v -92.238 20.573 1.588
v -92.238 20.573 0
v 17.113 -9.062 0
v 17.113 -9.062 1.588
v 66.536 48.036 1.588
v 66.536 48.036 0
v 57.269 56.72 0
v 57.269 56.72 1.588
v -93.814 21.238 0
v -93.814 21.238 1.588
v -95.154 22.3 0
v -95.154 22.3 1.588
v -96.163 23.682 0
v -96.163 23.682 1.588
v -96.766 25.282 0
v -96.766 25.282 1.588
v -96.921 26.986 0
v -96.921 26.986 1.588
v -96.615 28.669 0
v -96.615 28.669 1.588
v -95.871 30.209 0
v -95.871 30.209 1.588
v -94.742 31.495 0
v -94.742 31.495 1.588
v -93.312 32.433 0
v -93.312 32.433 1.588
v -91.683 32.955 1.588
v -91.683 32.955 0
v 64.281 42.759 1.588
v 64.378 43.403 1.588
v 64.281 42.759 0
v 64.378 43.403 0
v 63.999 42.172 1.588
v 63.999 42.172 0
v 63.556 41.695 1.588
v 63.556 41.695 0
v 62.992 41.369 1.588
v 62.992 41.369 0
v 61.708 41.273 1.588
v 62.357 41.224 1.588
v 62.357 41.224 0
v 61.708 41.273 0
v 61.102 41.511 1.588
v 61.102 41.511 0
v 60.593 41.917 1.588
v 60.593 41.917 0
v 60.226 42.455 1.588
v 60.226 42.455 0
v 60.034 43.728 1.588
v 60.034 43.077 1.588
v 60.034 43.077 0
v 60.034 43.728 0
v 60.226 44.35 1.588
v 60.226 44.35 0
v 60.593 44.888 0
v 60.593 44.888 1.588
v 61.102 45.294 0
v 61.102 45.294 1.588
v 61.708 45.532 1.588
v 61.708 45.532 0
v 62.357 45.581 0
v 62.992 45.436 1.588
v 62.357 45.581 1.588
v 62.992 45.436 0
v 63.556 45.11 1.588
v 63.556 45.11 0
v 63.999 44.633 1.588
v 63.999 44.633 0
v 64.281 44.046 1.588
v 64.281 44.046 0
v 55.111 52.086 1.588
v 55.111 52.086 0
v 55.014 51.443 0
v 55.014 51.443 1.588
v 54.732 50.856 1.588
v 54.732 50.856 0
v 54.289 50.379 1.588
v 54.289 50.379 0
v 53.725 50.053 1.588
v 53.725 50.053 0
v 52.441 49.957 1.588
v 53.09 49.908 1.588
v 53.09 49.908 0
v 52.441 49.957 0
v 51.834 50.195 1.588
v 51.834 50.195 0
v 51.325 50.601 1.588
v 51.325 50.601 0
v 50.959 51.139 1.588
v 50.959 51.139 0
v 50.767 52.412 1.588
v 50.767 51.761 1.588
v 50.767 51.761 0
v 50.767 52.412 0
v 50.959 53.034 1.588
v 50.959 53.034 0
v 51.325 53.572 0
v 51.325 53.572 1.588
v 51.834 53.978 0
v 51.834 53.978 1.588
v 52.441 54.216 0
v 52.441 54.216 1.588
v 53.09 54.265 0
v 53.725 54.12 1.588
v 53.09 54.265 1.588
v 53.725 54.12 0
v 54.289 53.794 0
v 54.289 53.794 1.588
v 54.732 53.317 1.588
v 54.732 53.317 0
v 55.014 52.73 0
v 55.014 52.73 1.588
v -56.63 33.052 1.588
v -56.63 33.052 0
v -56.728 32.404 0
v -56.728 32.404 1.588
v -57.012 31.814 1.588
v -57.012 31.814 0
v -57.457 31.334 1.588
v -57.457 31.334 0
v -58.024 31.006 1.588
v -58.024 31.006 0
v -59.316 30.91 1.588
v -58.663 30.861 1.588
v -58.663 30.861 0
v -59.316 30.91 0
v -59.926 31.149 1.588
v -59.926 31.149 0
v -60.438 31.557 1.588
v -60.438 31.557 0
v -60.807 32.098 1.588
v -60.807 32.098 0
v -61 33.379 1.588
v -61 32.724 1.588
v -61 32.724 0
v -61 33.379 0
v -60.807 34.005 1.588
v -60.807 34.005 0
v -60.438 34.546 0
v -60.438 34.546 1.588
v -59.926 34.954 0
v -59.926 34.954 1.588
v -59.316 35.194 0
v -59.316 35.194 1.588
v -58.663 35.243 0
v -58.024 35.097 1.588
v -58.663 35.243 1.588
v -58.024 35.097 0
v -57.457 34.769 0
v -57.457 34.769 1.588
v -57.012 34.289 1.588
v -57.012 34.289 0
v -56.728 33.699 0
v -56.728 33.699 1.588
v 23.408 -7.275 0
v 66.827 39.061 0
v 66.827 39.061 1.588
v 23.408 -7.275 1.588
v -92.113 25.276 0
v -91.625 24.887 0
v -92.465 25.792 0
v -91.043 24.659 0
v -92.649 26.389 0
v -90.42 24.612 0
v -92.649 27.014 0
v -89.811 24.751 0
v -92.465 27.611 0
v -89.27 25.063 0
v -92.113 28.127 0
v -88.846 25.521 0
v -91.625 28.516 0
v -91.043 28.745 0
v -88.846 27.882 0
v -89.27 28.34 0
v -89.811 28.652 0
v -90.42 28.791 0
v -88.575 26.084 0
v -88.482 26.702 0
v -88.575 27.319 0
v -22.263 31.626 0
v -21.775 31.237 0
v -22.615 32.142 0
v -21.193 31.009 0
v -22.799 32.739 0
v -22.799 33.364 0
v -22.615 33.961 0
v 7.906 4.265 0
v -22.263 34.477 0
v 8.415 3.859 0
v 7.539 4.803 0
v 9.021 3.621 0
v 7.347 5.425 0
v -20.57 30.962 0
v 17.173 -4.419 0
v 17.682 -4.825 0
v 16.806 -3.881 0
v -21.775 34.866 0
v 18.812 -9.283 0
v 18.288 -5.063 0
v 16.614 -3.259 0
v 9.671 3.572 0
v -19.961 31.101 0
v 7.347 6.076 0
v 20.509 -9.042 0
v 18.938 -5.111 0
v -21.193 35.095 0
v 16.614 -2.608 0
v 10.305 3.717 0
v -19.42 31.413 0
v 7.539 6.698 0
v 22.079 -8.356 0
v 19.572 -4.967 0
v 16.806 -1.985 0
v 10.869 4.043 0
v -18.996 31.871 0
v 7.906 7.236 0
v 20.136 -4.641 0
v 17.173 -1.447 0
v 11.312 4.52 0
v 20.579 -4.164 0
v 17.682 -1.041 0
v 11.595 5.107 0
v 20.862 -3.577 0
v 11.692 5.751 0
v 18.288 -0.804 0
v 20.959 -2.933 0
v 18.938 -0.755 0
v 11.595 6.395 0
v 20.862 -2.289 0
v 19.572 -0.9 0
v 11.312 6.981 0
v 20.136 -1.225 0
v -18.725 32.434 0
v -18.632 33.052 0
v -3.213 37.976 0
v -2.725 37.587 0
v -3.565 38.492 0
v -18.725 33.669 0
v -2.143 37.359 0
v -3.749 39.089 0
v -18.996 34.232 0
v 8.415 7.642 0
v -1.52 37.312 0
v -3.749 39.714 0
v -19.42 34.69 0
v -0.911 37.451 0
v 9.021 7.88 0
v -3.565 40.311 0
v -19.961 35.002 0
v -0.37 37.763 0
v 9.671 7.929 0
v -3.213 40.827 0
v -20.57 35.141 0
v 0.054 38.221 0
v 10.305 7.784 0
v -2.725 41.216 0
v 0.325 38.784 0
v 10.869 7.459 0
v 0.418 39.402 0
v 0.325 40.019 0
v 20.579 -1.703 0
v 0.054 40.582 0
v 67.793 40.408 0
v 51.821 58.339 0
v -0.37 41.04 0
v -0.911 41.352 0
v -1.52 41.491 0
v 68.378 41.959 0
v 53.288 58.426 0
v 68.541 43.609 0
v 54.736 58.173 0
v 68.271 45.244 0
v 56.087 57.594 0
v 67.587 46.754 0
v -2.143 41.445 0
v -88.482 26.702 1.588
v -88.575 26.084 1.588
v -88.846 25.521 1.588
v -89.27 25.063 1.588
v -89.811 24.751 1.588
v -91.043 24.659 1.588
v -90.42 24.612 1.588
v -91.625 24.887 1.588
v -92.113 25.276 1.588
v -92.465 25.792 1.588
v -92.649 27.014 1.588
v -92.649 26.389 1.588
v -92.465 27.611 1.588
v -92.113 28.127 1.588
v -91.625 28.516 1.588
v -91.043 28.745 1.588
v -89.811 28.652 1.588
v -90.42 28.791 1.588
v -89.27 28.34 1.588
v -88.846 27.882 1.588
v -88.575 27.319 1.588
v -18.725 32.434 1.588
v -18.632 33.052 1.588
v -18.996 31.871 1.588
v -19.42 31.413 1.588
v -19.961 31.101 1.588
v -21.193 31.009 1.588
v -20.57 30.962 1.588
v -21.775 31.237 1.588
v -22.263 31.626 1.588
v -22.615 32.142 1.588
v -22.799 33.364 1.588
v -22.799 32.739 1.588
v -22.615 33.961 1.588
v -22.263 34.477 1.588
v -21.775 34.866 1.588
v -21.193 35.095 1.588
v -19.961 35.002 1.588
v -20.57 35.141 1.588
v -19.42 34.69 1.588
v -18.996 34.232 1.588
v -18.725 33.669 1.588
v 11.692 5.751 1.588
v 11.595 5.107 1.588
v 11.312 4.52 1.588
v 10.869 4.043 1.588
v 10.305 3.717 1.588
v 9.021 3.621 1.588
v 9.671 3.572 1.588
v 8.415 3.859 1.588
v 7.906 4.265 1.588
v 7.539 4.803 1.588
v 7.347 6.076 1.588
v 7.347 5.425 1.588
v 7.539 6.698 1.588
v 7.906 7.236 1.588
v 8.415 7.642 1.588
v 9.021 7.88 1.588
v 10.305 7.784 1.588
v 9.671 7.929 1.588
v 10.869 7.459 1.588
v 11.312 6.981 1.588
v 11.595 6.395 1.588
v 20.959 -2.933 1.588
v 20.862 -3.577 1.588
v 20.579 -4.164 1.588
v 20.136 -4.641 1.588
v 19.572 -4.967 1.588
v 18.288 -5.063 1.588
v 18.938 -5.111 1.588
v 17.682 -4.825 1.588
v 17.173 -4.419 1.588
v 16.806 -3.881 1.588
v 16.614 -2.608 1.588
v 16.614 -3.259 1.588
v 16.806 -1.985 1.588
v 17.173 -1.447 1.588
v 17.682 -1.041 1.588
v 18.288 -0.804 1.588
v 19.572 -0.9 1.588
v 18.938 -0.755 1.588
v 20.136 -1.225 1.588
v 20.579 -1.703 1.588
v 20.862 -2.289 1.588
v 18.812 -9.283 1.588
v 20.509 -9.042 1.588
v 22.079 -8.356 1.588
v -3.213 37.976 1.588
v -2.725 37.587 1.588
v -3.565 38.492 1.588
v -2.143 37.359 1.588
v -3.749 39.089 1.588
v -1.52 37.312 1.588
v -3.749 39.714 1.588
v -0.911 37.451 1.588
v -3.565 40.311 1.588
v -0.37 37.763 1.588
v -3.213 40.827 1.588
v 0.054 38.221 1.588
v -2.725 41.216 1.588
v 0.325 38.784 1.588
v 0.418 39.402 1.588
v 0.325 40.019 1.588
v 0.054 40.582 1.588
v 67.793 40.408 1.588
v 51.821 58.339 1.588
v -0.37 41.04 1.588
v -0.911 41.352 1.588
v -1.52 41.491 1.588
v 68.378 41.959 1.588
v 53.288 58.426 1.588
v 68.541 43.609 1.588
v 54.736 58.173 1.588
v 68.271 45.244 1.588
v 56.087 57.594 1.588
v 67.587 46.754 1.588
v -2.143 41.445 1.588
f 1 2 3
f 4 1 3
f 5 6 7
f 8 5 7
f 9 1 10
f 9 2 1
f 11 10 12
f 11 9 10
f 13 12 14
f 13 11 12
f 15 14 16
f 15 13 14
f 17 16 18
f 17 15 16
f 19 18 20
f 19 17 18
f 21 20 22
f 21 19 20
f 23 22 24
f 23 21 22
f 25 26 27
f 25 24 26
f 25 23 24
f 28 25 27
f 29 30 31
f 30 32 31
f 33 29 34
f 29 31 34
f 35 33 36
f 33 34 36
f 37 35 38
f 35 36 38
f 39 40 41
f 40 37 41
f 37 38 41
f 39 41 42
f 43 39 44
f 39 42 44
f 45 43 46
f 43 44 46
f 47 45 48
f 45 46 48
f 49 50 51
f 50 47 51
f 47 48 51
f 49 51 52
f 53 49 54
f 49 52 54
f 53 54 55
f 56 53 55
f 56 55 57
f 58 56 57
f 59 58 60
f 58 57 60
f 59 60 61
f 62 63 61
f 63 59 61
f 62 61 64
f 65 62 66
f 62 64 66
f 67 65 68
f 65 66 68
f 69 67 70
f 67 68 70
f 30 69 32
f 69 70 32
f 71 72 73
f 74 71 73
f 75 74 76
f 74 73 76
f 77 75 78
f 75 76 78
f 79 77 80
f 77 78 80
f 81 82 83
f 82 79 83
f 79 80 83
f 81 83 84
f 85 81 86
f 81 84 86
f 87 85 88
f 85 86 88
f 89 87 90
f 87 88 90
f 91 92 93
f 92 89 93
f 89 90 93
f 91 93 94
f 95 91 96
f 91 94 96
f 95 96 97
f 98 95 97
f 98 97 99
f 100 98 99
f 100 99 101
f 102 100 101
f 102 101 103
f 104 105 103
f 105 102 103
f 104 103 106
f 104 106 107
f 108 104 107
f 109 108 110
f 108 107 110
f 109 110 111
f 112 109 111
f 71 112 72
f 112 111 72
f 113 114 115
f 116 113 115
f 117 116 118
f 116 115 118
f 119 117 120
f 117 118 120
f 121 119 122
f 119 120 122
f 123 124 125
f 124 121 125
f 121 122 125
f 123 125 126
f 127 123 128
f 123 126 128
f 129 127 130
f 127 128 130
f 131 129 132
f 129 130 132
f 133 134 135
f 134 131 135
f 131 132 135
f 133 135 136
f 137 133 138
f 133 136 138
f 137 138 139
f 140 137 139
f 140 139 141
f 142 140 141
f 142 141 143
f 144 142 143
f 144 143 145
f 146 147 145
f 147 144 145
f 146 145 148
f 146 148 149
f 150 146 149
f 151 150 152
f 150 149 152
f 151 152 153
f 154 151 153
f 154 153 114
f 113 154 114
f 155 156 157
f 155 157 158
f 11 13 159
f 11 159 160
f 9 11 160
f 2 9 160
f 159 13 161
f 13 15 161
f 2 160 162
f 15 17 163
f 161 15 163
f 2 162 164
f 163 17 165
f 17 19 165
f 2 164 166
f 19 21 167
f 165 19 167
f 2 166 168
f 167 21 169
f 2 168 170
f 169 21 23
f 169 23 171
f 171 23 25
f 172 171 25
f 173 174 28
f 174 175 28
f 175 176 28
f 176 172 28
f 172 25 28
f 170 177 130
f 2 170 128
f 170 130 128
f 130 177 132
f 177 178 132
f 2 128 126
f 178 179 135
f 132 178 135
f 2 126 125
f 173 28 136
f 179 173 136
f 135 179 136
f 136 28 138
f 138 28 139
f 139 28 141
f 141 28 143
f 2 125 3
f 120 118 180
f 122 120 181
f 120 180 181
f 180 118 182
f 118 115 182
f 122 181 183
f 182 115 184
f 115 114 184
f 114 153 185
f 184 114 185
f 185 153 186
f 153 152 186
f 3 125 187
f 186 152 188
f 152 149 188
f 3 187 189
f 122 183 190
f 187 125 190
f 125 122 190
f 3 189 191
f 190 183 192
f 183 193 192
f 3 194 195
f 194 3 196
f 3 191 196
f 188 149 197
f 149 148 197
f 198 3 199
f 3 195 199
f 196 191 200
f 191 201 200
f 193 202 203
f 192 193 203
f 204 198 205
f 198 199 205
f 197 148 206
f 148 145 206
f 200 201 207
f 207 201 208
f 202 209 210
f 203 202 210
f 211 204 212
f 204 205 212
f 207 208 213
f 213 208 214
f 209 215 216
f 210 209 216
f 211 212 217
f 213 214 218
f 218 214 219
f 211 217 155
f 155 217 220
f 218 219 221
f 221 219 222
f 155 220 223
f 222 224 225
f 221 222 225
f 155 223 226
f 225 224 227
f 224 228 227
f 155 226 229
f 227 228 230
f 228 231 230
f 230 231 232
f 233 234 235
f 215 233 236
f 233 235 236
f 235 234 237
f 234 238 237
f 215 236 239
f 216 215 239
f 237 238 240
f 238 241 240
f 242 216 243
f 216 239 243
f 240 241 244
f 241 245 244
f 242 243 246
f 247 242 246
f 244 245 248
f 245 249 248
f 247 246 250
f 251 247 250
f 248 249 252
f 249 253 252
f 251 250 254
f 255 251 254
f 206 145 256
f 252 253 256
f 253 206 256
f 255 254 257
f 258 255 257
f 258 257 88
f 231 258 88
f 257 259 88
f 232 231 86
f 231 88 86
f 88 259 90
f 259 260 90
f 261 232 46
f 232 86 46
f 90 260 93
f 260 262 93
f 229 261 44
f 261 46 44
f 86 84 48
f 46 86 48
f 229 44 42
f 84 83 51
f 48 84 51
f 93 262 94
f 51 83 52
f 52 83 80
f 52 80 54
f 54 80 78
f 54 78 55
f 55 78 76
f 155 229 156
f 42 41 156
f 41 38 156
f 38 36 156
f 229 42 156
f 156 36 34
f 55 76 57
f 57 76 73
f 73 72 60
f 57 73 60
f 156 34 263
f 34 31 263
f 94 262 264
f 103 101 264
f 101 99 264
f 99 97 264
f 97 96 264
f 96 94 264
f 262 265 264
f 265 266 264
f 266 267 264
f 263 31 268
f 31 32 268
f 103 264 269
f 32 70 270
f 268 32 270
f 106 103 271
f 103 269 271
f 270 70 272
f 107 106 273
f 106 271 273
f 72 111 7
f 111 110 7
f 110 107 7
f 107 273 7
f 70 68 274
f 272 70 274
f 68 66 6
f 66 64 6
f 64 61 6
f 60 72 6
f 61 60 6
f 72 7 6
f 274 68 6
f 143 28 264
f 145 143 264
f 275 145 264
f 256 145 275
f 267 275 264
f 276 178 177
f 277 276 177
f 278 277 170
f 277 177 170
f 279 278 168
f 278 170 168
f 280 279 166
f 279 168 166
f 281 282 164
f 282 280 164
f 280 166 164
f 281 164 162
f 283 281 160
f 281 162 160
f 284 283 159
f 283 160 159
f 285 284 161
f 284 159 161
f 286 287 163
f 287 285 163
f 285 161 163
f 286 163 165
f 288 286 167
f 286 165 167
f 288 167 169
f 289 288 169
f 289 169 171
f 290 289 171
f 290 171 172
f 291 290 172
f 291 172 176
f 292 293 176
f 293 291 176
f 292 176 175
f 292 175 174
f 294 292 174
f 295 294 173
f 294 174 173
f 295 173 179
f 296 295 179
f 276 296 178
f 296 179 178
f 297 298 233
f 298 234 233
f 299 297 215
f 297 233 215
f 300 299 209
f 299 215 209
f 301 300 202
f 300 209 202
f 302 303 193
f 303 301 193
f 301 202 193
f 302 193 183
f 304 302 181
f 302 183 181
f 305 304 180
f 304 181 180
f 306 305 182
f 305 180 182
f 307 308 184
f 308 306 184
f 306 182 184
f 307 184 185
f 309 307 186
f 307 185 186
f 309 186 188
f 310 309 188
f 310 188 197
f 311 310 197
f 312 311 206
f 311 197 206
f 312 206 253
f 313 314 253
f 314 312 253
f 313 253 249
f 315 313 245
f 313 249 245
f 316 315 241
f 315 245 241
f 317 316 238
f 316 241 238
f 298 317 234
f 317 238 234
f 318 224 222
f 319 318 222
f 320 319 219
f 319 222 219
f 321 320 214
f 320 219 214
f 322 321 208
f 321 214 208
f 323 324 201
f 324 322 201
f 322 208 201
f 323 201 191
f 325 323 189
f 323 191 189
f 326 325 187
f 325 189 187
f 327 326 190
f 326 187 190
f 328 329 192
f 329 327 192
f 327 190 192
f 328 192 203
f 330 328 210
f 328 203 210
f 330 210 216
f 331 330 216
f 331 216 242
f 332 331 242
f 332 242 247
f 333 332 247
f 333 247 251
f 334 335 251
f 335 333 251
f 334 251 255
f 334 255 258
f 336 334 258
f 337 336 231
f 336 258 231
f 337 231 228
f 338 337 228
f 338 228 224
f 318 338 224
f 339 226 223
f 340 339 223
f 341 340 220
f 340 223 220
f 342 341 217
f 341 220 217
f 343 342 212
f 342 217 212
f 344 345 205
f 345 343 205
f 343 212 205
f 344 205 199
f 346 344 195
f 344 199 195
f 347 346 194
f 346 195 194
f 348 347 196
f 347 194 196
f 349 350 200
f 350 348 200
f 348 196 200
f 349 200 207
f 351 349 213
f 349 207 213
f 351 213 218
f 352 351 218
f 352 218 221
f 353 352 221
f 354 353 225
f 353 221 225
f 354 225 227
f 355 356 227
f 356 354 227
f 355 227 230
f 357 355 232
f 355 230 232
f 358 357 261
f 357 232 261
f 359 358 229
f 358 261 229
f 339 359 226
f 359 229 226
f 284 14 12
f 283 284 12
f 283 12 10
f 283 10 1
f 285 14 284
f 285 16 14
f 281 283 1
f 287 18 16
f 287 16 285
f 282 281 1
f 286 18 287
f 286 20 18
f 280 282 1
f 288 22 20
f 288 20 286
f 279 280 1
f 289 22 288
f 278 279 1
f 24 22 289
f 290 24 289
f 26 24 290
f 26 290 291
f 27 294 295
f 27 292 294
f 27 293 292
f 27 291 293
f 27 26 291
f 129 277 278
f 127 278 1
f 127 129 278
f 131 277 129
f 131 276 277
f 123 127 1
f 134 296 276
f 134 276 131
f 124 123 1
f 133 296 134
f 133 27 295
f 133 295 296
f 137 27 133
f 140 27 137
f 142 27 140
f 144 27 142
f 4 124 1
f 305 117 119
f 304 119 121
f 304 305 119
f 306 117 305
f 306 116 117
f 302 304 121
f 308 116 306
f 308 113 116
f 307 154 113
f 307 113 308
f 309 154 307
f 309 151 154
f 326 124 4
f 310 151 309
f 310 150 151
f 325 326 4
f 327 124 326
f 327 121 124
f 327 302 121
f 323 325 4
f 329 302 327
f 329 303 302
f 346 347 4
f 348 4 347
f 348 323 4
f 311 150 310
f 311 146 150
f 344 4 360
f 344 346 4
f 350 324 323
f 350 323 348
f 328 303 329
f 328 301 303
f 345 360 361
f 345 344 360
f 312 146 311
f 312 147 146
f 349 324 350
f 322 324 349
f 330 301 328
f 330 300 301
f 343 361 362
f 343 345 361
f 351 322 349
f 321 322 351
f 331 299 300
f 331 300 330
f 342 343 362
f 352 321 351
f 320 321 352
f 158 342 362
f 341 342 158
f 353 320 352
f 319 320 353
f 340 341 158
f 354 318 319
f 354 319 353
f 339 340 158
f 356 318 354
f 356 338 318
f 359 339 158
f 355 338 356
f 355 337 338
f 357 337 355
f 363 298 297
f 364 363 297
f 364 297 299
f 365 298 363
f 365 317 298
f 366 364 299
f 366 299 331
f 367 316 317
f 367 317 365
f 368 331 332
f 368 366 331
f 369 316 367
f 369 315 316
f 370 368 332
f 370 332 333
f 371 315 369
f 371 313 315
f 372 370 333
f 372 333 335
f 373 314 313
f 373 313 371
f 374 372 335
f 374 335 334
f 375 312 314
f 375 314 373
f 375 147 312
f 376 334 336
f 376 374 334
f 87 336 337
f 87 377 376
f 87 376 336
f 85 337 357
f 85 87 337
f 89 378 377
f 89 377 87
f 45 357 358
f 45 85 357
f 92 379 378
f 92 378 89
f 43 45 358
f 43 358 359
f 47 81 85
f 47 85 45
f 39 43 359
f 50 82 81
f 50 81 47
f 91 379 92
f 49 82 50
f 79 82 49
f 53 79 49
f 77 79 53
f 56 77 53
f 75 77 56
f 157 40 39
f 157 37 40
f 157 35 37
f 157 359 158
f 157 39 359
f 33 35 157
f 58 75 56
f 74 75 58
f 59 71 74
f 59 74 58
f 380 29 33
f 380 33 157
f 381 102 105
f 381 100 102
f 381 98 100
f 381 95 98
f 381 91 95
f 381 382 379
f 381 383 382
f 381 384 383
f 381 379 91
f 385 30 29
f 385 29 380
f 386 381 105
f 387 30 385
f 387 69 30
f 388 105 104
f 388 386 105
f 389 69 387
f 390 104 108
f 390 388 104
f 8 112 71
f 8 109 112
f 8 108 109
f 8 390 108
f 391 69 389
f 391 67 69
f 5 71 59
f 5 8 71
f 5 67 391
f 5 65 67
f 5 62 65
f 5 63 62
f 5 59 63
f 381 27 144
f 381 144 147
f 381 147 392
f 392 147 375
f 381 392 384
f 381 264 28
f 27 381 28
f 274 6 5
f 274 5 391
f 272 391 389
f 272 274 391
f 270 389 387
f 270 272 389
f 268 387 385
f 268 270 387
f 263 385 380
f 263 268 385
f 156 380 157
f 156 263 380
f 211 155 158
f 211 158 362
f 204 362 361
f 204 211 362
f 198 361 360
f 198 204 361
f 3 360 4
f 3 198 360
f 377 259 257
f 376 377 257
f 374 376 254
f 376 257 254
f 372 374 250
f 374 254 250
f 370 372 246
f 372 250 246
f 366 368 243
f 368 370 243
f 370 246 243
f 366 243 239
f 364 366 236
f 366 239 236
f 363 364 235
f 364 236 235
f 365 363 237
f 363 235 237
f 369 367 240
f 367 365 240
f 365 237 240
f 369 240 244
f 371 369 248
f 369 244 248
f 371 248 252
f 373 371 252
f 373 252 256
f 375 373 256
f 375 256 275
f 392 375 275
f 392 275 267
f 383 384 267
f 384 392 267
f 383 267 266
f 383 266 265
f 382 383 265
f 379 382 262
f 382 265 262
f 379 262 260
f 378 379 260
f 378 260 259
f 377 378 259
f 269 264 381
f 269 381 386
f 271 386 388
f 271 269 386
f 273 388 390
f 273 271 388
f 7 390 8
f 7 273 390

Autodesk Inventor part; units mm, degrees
ref_plane "YZ Plane" through (0, 0, 0) normal (1, 0, 0) x (0, 1, 0)
ref_plane "XZ Plane" through (0, 0, 0) normal (0, 1, 0) x (-1, 0, 0)
ref_plane "XY Plane" through (0, 0, 0) normal (0, 0, 1) x (1, 0, 0)
sketch "Sketch2" plane through (0, 0, 0) normal (0, 0, 1) x (1, 0, 0)
  circle A0 centre (-58.827, 33.0516) radius 2.1971
  circle A1 centre (-20.727, 33.0516) radius 2.0955
  circle A2 centre (62.1938, 43.4026) radius 2.1844
  circle A3 centre (52.9267, 52.0864) radius 2.1844
  circle A4 centre (18.7744, -2.9332) radius 2.1844
  circle A5 centre (9.5073, 5.7507) radius 2.1844
  circle A6 centre (-90.577, 26.7016) radius 2.0955
  circle A7 centre (-1.677, 39.4016) radius 2.0955
  arc A8 (-91.6831, 32.9546) -> (-92.238, 20.5727) centre (-90.577, 26.7016) ccw
  arc A9 (57.2686, 56.72) -> (51.8206, 58.3394) centre (52.9267, 52.0864) ccw
  arc A10 (66.8274, 39.0606) -> (66.5358, 48.0361) centre (62.1938, 43.4026) ccw
  arc A11 (17.1134, -9.0622) -> (23.408, -7.2752) centre (18.7744, -2.9332) ccw
  line L0 (-92.238, 20.5727) -> (17.1134, -9.0622)
  line L1 (66.8274, 39.0606) -> (23.408, -7.2752)
  line L2 (66.5358, 48.0361) -> (57.2686, 56.72)
  line L3 (51.8206, 58.3394) -> (-91.6831, 32.9546)
  dimension "d17" = 4.191
  dimension "d18" = 4.191
  dimension "d19" = 12.7
  dimension "d20" = 12.7
  dimension "d21" = 12.7
  dimension "d22" = 12.7
extrude "Extrusion2" add sketch "Sketch2" along normal blind 1.5875
properties part number "1-Gearbox"
